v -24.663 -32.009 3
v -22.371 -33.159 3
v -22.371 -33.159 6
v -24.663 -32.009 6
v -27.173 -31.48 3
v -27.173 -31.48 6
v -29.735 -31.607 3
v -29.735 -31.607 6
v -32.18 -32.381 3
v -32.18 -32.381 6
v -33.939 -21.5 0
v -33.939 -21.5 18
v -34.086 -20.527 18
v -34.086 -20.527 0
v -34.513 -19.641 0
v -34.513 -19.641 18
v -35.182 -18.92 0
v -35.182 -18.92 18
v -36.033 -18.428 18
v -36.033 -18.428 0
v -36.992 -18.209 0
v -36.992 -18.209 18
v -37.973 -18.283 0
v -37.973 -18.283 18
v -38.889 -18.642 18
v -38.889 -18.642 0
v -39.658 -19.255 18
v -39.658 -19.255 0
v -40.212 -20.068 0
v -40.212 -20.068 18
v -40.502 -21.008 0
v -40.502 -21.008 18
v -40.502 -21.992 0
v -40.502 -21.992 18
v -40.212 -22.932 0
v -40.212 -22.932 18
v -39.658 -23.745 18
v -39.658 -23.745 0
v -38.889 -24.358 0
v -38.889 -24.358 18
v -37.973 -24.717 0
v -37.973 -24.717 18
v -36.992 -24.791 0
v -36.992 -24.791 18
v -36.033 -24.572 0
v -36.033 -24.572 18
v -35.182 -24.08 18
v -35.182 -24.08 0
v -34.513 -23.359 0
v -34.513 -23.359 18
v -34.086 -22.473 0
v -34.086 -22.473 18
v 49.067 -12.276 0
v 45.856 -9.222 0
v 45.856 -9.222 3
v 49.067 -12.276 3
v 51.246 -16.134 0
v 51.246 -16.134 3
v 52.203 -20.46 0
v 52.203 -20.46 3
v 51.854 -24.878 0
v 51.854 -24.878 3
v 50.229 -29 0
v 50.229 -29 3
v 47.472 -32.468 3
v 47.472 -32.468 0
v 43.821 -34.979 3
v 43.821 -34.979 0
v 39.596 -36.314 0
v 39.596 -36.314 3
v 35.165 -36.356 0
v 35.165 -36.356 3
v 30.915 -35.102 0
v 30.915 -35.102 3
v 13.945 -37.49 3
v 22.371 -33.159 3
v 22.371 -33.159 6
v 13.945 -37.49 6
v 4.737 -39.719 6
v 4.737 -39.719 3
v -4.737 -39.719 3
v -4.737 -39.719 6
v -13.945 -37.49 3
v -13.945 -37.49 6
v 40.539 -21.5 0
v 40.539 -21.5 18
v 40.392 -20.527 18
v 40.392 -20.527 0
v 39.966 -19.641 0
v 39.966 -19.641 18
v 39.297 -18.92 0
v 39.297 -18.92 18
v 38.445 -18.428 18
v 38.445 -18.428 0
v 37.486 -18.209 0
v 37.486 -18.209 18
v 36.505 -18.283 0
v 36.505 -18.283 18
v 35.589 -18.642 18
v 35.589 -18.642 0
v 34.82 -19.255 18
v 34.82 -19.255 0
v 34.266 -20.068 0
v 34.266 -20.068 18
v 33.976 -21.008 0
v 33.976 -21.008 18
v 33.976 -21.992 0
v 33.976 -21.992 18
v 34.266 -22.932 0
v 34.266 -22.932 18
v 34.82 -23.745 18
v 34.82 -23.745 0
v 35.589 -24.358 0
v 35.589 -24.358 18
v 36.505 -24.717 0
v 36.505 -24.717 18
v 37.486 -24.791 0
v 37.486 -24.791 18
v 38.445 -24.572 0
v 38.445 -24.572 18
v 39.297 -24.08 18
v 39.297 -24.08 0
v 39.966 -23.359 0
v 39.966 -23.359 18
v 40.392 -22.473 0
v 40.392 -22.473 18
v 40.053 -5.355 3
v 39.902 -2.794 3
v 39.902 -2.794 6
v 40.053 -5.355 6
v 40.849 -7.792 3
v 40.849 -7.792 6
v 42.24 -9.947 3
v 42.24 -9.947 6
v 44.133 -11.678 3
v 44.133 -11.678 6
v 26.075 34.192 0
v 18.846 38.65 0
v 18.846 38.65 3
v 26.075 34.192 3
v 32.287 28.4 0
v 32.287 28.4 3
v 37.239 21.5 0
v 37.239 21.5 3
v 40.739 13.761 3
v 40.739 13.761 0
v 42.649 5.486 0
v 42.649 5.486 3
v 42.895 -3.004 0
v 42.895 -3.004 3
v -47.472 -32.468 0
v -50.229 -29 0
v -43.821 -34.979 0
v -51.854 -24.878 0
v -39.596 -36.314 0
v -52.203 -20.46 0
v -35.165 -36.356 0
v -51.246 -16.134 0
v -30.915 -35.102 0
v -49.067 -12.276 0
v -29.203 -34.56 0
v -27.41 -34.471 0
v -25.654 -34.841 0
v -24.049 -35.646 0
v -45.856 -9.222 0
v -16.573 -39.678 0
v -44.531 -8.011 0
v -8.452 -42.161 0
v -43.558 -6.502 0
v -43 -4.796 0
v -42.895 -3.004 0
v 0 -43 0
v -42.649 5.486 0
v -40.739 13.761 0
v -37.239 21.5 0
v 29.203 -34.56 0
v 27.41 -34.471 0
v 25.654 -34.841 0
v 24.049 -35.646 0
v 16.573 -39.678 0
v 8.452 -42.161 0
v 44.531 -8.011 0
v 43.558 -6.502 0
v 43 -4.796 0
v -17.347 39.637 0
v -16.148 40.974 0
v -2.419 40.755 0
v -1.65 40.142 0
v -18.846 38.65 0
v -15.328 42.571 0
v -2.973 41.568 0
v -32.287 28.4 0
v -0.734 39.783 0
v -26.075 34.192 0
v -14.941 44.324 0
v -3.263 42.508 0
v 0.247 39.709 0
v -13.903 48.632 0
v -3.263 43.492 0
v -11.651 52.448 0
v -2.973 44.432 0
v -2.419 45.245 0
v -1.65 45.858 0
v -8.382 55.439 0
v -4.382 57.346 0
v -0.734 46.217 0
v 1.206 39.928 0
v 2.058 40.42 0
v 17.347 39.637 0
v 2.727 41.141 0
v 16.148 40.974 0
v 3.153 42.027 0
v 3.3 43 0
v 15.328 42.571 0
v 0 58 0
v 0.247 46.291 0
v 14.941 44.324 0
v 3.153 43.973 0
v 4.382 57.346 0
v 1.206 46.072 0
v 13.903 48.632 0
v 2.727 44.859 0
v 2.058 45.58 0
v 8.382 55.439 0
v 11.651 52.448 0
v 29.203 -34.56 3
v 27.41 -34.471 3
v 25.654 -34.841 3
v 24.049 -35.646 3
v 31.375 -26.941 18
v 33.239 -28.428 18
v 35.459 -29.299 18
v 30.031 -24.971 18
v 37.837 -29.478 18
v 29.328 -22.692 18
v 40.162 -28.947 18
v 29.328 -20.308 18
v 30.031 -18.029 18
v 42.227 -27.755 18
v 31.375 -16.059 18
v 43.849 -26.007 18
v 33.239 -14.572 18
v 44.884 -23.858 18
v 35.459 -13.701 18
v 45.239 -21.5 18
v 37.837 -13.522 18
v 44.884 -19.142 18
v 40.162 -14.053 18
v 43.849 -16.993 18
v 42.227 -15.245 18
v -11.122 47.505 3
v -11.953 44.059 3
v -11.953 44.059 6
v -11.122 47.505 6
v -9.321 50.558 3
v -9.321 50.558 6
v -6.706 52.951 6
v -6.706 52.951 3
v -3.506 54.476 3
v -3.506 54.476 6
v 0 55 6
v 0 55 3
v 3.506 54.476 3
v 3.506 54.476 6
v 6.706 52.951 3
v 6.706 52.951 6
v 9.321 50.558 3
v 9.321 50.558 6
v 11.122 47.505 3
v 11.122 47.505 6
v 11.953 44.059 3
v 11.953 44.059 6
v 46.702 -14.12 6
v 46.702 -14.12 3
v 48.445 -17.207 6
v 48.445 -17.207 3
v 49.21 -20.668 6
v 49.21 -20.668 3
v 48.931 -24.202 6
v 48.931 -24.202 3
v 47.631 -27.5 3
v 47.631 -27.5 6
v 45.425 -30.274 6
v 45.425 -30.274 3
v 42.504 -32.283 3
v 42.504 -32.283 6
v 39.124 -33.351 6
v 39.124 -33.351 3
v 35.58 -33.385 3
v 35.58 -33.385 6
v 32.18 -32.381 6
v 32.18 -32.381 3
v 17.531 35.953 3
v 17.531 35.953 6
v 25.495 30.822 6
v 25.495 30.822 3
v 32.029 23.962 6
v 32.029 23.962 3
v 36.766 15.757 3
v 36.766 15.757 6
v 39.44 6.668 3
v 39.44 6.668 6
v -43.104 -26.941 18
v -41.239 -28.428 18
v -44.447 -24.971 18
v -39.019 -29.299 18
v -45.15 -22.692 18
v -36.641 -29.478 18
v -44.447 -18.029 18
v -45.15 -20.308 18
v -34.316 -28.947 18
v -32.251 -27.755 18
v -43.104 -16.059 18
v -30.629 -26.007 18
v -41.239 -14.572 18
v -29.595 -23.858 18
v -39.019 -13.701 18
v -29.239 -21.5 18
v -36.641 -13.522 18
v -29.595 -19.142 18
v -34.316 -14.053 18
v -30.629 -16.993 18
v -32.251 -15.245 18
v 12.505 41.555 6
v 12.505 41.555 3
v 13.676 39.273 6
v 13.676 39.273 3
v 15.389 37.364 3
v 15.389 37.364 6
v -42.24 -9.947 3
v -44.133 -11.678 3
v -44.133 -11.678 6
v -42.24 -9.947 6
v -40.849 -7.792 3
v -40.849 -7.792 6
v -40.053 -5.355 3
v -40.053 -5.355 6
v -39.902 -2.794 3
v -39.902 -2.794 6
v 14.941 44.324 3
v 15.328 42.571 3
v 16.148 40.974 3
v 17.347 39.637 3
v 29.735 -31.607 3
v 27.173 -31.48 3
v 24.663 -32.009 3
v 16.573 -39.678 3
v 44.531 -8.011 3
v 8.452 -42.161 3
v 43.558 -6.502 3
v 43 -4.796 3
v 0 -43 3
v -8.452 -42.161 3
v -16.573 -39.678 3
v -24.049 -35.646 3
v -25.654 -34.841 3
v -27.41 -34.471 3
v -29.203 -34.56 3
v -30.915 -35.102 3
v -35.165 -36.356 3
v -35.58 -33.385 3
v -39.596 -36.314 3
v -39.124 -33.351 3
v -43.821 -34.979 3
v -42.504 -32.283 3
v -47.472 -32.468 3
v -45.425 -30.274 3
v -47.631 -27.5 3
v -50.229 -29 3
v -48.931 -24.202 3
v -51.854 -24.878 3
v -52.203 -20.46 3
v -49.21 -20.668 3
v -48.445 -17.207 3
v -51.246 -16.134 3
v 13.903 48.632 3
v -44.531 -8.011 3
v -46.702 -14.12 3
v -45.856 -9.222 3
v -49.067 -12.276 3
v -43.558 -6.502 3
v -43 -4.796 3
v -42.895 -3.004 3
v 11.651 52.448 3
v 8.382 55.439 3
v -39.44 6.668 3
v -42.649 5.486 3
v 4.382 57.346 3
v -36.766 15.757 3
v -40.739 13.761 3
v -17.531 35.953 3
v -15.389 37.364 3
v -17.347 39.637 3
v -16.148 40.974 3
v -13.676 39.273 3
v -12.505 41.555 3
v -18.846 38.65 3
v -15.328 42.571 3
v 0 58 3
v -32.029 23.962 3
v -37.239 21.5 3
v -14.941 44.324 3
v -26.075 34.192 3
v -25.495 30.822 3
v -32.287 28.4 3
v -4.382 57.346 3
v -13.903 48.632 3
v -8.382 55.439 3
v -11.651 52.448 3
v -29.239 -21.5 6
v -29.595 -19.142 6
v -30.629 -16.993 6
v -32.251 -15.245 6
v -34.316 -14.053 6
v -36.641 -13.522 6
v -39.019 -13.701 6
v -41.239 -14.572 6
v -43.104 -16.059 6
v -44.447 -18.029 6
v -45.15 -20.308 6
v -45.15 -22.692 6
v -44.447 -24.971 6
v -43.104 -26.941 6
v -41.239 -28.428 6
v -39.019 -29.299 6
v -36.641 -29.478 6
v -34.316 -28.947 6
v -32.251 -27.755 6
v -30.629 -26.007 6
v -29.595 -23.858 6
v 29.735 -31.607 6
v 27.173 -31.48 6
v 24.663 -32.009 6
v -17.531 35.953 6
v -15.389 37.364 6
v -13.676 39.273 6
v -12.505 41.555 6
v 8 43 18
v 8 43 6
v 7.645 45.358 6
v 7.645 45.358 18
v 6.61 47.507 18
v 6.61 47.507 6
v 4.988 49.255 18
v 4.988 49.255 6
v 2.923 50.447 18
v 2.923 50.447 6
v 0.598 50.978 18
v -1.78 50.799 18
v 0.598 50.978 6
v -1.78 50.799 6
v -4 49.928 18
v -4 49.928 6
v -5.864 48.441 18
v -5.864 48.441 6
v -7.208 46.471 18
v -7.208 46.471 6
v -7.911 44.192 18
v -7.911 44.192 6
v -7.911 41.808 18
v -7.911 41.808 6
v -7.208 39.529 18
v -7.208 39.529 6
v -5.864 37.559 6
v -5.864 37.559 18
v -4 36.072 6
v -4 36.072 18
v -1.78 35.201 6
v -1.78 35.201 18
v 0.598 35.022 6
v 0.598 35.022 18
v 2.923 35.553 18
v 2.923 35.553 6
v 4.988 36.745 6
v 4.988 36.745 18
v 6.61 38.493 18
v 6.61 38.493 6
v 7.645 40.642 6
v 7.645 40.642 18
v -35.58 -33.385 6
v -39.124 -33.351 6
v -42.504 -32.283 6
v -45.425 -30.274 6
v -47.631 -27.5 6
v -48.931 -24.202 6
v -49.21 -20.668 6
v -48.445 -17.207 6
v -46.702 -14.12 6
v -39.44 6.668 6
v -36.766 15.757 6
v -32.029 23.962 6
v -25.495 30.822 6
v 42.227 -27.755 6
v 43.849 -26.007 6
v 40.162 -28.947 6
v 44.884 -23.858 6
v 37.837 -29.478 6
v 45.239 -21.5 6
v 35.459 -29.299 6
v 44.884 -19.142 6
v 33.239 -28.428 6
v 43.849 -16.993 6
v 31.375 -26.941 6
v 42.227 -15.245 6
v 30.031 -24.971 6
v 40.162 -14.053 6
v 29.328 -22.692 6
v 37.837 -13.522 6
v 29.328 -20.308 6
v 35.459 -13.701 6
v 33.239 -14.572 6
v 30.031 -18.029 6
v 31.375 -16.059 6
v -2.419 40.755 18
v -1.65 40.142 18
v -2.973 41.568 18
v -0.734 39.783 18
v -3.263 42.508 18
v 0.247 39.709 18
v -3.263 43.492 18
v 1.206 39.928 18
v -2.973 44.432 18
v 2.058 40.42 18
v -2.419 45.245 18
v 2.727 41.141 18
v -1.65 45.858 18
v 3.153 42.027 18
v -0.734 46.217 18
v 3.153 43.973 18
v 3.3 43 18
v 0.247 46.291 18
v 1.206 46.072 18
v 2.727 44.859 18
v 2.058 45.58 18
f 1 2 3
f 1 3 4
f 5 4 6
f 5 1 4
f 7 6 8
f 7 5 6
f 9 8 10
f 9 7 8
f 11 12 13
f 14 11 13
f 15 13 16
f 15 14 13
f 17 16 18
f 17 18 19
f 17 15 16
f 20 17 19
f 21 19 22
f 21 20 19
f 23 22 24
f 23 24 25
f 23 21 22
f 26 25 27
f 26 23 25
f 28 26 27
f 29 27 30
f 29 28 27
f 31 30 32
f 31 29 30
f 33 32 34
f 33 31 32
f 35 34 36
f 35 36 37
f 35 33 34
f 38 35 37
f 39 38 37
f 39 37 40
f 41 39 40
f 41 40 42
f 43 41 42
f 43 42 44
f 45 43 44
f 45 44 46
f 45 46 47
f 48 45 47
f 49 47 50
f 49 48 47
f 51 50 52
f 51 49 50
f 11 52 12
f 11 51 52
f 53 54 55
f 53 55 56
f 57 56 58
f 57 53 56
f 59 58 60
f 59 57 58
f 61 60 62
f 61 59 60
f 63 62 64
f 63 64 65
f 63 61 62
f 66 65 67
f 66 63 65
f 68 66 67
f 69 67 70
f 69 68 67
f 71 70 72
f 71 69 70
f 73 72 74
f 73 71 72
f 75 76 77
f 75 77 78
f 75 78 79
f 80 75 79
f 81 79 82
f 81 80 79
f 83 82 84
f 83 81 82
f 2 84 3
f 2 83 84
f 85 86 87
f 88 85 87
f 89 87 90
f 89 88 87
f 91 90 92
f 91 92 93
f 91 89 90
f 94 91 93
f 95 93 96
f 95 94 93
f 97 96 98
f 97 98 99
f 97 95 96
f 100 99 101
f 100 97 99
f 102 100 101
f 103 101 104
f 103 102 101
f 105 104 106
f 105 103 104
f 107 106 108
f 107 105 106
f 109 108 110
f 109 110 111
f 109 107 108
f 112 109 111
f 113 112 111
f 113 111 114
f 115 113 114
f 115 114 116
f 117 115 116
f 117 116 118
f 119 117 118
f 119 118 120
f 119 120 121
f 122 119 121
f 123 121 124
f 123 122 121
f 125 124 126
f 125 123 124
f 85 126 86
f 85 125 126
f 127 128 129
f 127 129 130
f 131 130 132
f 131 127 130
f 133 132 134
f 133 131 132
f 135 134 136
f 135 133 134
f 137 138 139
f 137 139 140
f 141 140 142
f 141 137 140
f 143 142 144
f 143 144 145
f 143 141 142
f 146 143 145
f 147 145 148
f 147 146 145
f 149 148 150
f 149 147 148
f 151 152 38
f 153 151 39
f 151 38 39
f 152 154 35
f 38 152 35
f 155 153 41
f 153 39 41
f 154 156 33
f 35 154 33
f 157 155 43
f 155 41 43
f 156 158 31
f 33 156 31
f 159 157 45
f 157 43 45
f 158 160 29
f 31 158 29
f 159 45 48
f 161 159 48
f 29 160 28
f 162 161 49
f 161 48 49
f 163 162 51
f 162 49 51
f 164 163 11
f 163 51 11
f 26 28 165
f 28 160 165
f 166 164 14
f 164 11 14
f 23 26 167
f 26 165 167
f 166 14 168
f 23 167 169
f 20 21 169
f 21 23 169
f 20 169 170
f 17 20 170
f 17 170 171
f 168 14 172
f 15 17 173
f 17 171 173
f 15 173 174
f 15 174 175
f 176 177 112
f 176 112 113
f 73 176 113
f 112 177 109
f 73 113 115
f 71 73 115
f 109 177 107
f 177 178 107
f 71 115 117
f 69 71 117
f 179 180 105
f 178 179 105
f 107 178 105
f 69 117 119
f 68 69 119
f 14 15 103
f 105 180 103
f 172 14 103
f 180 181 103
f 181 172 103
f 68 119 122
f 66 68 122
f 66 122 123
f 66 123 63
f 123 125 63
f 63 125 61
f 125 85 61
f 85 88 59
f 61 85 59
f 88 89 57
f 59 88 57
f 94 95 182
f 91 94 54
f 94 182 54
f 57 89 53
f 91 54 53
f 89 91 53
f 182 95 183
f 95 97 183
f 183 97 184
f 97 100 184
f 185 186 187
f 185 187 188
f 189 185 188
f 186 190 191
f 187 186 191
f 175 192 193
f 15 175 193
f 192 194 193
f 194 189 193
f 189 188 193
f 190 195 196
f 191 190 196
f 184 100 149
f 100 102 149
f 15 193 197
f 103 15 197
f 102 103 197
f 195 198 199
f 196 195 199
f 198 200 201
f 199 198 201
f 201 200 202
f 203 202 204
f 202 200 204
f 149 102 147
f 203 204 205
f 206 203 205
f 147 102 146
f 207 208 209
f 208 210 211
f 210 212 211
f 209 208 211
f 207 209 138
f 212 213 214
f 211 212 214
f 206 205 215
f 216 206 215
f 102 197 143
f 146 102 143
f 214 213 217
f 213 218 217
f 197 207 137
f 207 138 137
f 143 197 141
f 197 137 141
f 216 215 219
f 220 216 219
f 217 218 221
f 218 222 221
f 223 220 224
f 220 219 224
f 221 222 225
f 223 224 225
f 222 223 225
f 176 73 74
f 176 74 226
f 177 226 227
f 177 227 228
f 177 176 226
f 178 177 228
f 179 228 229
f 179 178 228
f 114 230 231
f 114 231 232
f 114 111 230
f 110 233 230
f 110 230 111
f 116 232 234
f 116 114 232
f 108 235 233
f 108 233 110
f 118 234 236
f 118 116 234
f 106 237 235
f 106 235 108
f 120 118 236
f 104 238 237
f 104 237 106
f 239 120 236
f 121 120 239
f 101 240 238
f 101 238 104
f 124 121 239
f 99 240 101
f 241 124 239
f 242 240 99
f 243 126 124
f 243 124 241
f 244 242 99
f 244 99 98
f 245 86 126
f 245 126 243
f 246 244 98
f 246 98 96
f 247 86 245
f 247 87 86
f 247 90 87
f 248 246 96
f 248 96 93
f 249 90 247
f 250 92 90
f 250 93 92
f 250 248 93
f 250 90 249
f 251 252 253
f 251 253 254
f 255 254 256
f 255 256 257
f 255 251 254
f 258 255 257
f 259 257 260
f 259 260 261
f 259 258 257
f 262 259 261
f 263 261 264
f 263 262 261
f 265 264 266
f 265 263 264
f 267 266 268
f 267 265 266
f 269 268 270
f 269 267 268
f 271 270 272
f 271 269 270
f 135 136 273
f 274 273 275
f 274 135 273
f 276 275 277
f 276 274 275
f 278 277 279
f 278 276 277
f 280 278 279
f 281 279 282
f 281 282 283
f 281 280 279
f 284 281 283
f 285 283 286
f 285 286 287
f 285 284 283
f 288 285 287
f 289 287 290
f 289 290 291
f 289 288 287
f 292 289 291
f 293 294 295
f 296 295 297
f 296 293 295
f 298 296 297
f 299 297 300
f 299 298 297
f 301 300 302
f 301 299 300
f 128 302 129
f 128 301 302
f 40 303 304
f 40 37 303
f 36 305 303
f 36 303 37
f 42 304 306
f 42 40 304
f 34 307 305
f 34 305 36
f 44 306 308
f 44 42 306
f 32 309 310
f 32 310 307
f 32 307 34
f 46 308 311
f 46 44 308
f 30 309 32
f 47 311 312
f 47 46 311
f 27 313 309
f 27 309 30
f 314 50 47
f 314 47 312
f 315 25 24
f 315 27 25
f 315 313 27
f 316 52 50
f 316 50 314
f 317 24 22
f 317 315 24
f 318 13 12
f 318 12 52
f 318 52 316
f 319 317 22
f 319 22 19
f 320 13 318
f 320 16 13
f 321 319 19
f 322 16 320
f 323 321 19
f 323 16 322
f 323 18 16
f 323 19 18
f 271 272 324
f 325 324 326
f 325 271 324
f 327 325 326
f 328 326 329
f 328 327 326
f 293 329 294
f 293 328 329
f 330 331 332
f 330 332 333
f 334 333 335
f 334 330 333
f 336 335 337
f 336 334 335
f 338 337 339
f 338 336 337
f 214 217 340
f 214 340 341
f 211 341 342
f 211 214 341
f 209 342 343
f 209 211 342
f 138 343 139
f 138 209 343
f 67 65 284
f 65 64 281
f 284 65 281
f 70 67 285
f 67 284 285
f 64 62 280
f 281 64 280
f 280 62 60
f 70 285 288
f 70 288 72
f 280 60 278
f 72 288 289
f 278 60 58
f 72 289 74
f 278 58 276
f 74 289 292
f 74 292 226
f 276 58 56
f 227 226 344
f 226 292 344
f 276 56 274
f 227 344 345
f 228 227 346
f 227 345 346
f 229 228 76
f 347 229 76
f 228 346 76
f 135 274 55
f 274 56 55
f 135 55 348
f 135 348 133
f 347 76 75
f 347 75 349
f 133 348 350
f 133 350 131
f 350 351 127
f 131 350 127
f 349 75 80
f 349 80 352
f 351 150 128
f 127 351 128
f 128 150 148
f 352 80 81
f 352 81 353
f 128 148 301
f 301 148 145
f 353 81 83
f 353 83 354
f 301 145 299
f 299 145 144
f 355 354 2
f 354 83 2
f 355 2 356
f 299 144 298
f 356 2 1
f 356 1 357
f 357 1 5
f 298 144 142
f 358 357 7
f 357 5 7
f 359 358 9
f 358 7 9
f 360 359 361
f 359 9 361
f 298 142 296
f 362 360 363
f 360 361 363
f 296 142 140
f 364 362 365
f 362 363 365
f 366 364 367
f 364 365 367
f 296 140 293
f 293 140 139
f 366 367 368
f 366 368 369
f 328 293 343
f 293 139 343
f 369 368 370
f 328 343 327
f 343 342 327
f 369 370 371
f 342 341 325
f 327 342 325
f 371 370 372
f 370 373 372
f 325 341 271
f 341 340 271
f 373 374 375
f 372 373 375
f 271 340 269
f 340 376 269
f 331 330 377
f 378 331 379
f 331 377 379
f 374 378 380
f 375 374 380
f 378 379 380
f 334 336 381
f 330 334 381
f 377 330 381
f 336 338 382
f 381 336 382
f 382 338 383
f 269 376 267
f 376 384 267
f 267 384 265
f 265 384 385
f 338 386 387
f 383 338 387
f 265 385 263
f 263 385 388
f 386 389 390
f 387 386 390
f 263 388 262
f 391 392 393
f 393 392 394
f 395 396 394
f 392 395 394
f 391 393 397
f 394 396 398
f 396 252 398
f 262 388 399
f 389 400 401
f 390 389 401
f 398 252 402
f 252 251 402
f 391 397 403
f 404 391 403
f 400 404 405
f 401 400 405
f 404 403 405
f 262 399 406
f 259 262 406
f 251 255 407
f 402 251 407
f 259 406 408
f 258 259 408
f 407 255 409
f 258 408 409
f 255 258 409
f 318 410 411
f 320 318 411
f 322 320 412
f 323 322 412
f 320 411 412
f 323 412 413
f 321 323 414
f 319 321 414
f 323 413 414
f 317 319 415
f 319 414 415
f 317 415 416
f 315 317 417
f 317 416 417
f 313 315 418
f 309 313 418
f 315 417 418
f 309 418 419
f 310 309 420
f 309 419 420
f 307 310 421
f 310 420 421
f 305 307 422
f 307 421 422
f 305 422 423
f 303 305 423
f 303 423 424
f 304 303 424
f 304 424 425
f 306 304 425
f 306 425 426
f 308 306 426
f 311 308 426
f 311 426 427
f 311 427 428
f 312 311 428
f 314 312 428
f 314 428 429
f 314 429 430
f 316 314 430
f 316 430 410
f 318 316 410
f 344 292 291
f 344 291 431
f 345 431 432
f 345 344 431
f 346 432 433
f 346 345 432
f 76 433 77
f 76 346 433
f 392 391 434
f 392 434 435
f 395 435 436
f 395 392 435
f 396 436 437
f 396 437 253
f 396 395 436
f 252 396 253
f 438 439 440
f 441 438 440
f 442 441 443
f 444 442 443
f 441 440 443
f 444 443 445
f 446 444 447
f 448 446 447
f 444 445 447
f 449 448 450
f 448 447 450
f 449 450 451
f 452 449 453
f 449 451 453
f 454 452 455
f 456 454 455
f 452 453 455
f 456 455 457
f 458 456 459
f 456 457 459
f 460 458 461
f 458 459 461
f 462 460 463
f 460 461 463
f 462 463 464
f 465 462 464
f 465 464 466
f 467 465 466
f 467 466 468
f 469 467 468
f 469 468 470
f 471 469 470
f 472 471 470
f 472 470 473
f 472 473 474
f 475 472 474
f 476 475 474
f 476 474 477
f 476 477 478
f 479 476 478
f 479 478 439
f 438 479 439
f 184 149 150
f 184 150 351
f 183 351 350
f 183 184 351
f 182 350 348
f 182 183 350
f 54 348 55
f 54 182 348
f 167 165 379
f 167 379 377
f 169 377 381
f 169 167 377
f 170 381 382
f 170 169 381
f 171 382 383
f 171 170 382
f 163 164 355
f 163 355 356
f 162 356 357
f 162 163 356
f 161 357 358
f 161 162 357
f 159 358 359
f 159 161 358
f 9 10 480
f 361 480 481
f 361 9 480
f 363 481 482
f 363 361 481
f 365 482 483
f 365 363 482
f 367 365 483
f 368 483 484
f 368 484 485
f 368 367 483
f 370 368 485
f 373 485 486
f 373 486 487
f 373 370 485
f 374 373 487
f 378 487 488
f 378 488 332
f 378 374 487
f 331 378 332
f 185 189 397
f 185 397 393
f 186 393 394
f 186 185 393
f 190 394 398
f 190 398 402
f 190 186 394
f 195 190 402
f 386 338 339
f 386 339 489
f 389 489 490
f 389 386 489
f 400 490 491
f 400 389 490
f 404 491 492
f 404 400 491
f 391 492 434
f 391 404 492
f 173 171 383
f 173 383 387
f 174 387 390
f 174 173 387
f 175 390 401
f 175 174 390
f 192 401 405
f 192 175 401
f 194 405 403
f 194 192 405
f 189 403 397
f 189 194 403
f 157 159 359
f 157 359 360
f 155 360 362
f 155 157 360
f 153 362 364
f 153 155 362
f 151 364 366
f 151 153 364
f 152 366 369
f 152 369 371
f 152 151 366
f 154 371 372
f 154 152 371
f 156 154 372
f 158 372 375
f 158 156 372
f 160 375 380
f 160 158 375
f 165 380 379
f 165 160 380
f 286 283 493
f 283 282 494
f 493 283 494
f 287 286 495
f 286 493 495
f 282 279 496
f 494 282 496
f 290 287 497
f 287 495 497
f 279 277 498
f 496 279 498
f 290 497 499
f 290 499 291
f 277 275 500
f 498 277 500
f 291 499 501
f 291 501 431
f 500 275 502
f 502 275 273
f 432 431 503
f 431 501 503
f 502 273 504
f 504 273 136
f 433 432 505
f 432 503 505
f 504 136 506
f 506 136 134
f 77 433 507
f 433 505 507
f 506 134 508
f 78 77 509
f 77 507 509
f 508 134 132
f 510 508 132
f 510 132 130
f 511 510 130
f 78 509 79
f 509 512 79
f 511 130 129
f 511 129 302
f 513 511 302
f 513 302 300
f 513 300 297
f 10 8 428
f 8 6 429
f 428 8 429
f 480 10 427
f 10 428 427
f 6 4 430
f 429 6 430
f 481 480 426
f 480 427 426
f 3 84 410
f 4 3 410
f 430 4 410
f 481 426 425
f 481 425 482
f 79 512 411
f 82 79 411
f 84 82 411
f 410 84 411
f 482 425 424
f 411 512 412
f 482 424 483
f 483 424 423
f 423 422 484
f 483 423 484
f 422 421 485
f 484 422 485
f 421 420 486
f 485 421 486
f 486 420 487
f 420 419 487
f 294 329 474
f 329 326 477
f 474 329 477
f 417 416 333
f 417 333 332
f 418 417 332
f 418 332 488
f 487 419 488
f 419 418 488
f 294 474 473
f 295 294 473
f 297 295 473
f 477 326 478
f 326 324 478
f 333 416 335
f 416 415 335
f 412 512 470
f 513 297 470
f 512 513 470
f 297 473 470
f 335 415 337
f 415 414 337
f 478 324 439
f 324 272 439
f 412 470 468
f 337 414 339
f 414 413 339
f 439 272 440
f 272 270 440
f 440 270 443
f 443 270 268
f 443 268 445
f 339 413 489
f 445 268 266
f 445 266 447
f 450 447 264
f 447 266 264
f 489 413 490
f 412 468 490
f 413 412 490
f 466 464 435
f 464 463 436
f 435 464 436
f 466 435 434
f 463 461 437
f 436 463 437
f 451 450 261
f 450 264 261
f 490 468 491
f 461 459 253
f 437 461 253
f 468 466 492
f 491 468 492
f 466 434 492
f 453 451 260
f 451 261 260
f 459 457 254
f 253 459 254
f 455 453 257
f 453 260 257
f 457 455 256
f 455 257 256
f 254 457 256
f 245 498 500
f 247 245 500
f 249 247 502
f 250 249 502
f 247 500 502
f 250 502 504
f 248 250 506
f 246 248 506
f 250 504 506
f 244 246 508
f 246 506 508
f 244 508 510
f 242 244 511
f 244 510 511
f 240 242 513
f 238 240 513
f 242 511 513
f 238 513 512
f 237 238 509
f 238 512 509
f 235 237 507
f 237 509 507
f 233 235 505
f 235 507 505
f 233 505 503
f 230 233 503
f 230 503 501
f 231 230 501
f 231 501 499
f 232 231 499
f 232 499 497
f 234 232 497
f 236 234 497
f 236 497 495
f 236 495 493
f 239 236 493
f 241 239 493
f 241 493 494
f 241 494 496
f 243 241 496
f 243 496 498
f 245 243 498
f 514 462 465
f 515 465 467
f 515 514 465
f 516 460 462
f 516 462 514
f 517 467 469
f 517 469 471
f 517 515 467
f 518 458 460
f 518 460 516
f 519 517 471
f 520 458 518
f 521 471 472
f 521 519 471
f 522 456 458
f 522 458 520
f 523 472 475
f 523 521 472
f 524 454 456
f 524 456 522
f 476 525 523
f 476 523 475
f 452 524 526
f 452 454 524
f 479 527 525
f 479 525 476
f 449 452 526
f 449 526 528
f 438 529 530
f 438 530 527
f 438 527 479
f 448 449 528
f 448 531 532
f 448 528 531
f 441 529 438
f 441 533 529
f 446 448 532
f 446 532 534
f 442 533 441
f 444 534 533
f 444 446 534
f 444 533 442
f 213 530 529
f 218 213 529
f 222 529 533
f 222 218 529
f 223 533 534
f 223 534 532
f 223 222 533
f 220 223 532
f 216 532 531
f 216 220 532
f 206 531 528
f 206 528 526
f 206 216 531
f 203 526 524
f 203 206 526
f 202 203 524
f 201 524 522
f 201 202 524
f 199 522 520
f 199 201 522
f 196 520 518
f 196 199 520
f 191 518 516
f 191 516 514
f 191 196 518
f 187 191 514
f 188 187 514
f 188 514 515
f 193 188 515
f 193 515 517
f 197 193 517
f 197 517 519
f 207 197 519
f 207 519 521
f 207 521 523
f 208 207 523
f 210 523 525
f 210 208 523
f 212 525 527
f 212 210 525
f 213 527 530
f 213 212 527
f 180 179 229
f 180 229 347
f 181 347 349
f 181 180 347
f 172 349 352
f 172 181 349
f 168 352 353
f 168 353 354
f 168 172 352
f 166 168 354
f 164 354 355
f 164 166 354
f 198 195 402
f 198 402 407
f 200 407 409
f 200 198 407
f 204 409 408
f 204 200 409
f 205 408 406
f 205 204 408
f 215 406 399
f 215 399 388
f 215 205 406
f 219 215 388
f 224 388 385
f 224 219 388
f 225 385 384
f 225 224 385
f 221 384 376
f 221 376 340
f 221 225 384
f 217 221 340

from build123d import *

# Parameters (mm, degrees)
BOSS_EXTRUDE1_DEPTH = 3
SKETCH1_3_R         = 8
BOSS_EXTRUDE2_DEPTH = 6
SKETCH1_5_R         = 8
SKETCH1_5_R_2       = 3.3
BOSS_EXTRUDE4_DEPTH = 18


with BuildPart() as part:
    # Sketch1 → Boss-Extrude1 (new body)
    with BuildSketch(Plane.XY):
        with BuildLine():
            ThreePointArc((-14.941453584, 44.323995772), (-16.147655157, 40.973517522), (-18.846153454, 38.65))
            ThreePointArc((-18.846153454, 38.65), (-37.239092363, 21.5), (-42.894958583, -3.003752345))
            ThreePointArc((-42.894958583, -3.003752345), (-43.557934635, -6.502479184), (-45.856433127, -9.222319513))
            ThreePointArc((-45.856433127, -9.222319513), (-50.229473419, -29), (-30.914979544, -35.101676259))
            ThreePointArc((-30.914979544, -35.101676259), (-27.410279478, -34.471038339), (-24.048805129, -35.646247655))
            ThreePointArc((-24.048805129, -35.646247655), (0, -43), (24.048805129, -35.646247655))
            ThreePointArc((24.048805129, -35.646247655), (27.410279478, -34.471038339), (30.914979544, -35.101676259))
            ThreePointArc((30.914979544, -35.101676259), (50.229473419, -29), (45.856433127, -9.222319513))
            ThreePointArc((45.856433127, -9.222319513), (43.557934635, -6.502479184), (42.894958583, -3.003752345))
            ThreePointArc((42.894958583, -3.003752345), (37.239092363, 21.5), (18.846153454, 38.65))
            ThreePointArc((18.846153454, 38.65), (16.147655157, 40.973517523), (14.941453584, 44.323995772))
            ThreePointArc((14.941453584, 44.323995772), (0, 58), (-14.941453584, 44.323995772))
        make_face()
        with BuildLine():
            ThreePointArc((-39.902287054, -2.794188228), (-34.641016151, 20), (-17.531305538, 35.953488372))
            ThreePointArc((-17.531305538, 35.953488372), (-13.676307972, 39.272799119), (-11.953162867, 44.059196617))
            ThreePointArc((-11.953162867, 44.059196617), (0, 55), (11.953162867, 44.059196617))
            ThreePointArc((11.953162867, 44.059196617), (13.676307972, 39.272799119), (17.531305538, 35.953488372))
            ThreePointArc((17.531305538, 35.953488372), (34.641016151, 20), (39.902287054, -2.794188228))
            ThreePointArc((39.902287054, -2.794188228), (40.8493957, -7.792369426), (44.132964974, -11.67785561))
            ThreePointArc((44.132964974, -11.67785561), (47.631397208, -27.5), (32.179802107, -32.381341007))
            ThreePointArc((32.179802107, -32.381341007), (27.173087728, -31.480429693), (22.370981516, -33.159300144))
            ThreePointArc((22.370981516, -33.159300144), (0, -40), (-22.370981516, -33.159300144))
            ThreePointArc((-22.370981516, -33.159300144), (-27.173087728, -31.480429693), (-32.179802107, -32.381341007))
            ThreePointArc((-32.179802107, -32.381341007), (-47.631397208, -27.5), (-44.132964974, -11.67785561))
            ThreePointArc((-44.132964974, -11.67785561), (-40.8493957, -7.792369426), (-39.902287054, -2.794188228))
        make_face(mode=Mode.SUBTRACT)
    extrude(amount=BOSS_EXTRUDE1_DEPTH)

    # Sketch1<3> → Boss-Extrude2 (add)
    with BuildSketch(Plane.XY):
        with BuildLine():
            ThreePointArc((-11.953162867, 44.059196617), (-13.676307972, 39.272799119), (-17.531305538, 35.953488372))
            ThreePointArc((-17.531305538, 35.953488372), (-34.641016151, 20), (-39.902287054, -2.794188228))
            ThreePointArc((-39.902287054, -2.794188228), (-40.8493957, -7.792369426), (-44.132964974, -11.67785561))
            ThreePointArc((-44.132964974, -11.67785561), (-47.631397208, -27.5), (-32.179802107, -32.381341007))
            ThreePointArc((-32.179802107, -32.381341007), (-27.173087728, -31.480429693), (-22.370981516, -33.159300144))
            ThreePointArc((-22.370981516, -33.159300144), (0, -40), (22.370981516, -33.159300144))
            ThreePointArc((22.370981516, -33.159300144), (27.173087728, -31.480429693), (32.179802107, -32.381341007))
            ThreePointArc((32.179802107, -32.381341007), (47.631397208, -27.5), (44.132964974, -11.67785561))
            ThreePointArc((44.132964974, -11.67785561), (40.8493957, -7.792369426), (39.902287054, -2.794188228))
            ThreePointArc((39.902287054, -2.794188228), (34.641016151, 20), (17.531305538, 35.953488372))
            ThreePointArc((17.531305538, 35.953488372), (13.676307972, 39.272799119), (11.953162867, 44.059196617))
            ThreePointArc((11.953162867, 44.059196617), (0, 55), (-11.953162867, 44.059196617))
        make_face()
        with Locations((-37.239092363, -21.5)):
            Circle(SKETCH1_3_R, mode=Mode.SUBTRACT)
        with Locations((37.239092363, -21.5)):
            Circle(SKETCH1_3_R, mode=Mode.SUBTRACT)
        with Locations((0, 43)):
            Circle(SKETCH1_3_R, mode=Mode.SUBTRACT)
    extrude(amount=BOSS_EXTRUDE2_DEPTH)

    # Sketch1<5> → Boss-Extrude4 (add)
    # profile 1 of 3: a face of its own
    with BuildSketch(Plane.XY):
        with Locations((0, 43)):
            Circle(SKETCH1_5_R)
        with Locations((0, 43)):
            Circle(SKETCH1_5_R_2, mode=Mode.SUBTRACT)
    # profile 2 of 3: a face of its own
    with BuildSketch(Plane.XY):
        with Locations((37.239092363, -21.5)):
            Circle(SKETCH1_5_R)
        with Locations((37.239092363, -21.5)):
            Circle(SKETCH1_5_R_2, mode=Mode.SUBTRACT)
    # profile 3 of 3: a face of its own
    with BuildSketch(Plane.XY):
        with Locations((-37.239092363, -21.5)):
            Circle(SKETCH1_5_R)
        with Locations((-37.239092363, -21.5)):
            Circle(SKETCH1_5_R_2, mode=Mode.SUBTRACT)
    extrude(amount=BOSS_EXTRUDE4_DEPTH)


solid = part.part
